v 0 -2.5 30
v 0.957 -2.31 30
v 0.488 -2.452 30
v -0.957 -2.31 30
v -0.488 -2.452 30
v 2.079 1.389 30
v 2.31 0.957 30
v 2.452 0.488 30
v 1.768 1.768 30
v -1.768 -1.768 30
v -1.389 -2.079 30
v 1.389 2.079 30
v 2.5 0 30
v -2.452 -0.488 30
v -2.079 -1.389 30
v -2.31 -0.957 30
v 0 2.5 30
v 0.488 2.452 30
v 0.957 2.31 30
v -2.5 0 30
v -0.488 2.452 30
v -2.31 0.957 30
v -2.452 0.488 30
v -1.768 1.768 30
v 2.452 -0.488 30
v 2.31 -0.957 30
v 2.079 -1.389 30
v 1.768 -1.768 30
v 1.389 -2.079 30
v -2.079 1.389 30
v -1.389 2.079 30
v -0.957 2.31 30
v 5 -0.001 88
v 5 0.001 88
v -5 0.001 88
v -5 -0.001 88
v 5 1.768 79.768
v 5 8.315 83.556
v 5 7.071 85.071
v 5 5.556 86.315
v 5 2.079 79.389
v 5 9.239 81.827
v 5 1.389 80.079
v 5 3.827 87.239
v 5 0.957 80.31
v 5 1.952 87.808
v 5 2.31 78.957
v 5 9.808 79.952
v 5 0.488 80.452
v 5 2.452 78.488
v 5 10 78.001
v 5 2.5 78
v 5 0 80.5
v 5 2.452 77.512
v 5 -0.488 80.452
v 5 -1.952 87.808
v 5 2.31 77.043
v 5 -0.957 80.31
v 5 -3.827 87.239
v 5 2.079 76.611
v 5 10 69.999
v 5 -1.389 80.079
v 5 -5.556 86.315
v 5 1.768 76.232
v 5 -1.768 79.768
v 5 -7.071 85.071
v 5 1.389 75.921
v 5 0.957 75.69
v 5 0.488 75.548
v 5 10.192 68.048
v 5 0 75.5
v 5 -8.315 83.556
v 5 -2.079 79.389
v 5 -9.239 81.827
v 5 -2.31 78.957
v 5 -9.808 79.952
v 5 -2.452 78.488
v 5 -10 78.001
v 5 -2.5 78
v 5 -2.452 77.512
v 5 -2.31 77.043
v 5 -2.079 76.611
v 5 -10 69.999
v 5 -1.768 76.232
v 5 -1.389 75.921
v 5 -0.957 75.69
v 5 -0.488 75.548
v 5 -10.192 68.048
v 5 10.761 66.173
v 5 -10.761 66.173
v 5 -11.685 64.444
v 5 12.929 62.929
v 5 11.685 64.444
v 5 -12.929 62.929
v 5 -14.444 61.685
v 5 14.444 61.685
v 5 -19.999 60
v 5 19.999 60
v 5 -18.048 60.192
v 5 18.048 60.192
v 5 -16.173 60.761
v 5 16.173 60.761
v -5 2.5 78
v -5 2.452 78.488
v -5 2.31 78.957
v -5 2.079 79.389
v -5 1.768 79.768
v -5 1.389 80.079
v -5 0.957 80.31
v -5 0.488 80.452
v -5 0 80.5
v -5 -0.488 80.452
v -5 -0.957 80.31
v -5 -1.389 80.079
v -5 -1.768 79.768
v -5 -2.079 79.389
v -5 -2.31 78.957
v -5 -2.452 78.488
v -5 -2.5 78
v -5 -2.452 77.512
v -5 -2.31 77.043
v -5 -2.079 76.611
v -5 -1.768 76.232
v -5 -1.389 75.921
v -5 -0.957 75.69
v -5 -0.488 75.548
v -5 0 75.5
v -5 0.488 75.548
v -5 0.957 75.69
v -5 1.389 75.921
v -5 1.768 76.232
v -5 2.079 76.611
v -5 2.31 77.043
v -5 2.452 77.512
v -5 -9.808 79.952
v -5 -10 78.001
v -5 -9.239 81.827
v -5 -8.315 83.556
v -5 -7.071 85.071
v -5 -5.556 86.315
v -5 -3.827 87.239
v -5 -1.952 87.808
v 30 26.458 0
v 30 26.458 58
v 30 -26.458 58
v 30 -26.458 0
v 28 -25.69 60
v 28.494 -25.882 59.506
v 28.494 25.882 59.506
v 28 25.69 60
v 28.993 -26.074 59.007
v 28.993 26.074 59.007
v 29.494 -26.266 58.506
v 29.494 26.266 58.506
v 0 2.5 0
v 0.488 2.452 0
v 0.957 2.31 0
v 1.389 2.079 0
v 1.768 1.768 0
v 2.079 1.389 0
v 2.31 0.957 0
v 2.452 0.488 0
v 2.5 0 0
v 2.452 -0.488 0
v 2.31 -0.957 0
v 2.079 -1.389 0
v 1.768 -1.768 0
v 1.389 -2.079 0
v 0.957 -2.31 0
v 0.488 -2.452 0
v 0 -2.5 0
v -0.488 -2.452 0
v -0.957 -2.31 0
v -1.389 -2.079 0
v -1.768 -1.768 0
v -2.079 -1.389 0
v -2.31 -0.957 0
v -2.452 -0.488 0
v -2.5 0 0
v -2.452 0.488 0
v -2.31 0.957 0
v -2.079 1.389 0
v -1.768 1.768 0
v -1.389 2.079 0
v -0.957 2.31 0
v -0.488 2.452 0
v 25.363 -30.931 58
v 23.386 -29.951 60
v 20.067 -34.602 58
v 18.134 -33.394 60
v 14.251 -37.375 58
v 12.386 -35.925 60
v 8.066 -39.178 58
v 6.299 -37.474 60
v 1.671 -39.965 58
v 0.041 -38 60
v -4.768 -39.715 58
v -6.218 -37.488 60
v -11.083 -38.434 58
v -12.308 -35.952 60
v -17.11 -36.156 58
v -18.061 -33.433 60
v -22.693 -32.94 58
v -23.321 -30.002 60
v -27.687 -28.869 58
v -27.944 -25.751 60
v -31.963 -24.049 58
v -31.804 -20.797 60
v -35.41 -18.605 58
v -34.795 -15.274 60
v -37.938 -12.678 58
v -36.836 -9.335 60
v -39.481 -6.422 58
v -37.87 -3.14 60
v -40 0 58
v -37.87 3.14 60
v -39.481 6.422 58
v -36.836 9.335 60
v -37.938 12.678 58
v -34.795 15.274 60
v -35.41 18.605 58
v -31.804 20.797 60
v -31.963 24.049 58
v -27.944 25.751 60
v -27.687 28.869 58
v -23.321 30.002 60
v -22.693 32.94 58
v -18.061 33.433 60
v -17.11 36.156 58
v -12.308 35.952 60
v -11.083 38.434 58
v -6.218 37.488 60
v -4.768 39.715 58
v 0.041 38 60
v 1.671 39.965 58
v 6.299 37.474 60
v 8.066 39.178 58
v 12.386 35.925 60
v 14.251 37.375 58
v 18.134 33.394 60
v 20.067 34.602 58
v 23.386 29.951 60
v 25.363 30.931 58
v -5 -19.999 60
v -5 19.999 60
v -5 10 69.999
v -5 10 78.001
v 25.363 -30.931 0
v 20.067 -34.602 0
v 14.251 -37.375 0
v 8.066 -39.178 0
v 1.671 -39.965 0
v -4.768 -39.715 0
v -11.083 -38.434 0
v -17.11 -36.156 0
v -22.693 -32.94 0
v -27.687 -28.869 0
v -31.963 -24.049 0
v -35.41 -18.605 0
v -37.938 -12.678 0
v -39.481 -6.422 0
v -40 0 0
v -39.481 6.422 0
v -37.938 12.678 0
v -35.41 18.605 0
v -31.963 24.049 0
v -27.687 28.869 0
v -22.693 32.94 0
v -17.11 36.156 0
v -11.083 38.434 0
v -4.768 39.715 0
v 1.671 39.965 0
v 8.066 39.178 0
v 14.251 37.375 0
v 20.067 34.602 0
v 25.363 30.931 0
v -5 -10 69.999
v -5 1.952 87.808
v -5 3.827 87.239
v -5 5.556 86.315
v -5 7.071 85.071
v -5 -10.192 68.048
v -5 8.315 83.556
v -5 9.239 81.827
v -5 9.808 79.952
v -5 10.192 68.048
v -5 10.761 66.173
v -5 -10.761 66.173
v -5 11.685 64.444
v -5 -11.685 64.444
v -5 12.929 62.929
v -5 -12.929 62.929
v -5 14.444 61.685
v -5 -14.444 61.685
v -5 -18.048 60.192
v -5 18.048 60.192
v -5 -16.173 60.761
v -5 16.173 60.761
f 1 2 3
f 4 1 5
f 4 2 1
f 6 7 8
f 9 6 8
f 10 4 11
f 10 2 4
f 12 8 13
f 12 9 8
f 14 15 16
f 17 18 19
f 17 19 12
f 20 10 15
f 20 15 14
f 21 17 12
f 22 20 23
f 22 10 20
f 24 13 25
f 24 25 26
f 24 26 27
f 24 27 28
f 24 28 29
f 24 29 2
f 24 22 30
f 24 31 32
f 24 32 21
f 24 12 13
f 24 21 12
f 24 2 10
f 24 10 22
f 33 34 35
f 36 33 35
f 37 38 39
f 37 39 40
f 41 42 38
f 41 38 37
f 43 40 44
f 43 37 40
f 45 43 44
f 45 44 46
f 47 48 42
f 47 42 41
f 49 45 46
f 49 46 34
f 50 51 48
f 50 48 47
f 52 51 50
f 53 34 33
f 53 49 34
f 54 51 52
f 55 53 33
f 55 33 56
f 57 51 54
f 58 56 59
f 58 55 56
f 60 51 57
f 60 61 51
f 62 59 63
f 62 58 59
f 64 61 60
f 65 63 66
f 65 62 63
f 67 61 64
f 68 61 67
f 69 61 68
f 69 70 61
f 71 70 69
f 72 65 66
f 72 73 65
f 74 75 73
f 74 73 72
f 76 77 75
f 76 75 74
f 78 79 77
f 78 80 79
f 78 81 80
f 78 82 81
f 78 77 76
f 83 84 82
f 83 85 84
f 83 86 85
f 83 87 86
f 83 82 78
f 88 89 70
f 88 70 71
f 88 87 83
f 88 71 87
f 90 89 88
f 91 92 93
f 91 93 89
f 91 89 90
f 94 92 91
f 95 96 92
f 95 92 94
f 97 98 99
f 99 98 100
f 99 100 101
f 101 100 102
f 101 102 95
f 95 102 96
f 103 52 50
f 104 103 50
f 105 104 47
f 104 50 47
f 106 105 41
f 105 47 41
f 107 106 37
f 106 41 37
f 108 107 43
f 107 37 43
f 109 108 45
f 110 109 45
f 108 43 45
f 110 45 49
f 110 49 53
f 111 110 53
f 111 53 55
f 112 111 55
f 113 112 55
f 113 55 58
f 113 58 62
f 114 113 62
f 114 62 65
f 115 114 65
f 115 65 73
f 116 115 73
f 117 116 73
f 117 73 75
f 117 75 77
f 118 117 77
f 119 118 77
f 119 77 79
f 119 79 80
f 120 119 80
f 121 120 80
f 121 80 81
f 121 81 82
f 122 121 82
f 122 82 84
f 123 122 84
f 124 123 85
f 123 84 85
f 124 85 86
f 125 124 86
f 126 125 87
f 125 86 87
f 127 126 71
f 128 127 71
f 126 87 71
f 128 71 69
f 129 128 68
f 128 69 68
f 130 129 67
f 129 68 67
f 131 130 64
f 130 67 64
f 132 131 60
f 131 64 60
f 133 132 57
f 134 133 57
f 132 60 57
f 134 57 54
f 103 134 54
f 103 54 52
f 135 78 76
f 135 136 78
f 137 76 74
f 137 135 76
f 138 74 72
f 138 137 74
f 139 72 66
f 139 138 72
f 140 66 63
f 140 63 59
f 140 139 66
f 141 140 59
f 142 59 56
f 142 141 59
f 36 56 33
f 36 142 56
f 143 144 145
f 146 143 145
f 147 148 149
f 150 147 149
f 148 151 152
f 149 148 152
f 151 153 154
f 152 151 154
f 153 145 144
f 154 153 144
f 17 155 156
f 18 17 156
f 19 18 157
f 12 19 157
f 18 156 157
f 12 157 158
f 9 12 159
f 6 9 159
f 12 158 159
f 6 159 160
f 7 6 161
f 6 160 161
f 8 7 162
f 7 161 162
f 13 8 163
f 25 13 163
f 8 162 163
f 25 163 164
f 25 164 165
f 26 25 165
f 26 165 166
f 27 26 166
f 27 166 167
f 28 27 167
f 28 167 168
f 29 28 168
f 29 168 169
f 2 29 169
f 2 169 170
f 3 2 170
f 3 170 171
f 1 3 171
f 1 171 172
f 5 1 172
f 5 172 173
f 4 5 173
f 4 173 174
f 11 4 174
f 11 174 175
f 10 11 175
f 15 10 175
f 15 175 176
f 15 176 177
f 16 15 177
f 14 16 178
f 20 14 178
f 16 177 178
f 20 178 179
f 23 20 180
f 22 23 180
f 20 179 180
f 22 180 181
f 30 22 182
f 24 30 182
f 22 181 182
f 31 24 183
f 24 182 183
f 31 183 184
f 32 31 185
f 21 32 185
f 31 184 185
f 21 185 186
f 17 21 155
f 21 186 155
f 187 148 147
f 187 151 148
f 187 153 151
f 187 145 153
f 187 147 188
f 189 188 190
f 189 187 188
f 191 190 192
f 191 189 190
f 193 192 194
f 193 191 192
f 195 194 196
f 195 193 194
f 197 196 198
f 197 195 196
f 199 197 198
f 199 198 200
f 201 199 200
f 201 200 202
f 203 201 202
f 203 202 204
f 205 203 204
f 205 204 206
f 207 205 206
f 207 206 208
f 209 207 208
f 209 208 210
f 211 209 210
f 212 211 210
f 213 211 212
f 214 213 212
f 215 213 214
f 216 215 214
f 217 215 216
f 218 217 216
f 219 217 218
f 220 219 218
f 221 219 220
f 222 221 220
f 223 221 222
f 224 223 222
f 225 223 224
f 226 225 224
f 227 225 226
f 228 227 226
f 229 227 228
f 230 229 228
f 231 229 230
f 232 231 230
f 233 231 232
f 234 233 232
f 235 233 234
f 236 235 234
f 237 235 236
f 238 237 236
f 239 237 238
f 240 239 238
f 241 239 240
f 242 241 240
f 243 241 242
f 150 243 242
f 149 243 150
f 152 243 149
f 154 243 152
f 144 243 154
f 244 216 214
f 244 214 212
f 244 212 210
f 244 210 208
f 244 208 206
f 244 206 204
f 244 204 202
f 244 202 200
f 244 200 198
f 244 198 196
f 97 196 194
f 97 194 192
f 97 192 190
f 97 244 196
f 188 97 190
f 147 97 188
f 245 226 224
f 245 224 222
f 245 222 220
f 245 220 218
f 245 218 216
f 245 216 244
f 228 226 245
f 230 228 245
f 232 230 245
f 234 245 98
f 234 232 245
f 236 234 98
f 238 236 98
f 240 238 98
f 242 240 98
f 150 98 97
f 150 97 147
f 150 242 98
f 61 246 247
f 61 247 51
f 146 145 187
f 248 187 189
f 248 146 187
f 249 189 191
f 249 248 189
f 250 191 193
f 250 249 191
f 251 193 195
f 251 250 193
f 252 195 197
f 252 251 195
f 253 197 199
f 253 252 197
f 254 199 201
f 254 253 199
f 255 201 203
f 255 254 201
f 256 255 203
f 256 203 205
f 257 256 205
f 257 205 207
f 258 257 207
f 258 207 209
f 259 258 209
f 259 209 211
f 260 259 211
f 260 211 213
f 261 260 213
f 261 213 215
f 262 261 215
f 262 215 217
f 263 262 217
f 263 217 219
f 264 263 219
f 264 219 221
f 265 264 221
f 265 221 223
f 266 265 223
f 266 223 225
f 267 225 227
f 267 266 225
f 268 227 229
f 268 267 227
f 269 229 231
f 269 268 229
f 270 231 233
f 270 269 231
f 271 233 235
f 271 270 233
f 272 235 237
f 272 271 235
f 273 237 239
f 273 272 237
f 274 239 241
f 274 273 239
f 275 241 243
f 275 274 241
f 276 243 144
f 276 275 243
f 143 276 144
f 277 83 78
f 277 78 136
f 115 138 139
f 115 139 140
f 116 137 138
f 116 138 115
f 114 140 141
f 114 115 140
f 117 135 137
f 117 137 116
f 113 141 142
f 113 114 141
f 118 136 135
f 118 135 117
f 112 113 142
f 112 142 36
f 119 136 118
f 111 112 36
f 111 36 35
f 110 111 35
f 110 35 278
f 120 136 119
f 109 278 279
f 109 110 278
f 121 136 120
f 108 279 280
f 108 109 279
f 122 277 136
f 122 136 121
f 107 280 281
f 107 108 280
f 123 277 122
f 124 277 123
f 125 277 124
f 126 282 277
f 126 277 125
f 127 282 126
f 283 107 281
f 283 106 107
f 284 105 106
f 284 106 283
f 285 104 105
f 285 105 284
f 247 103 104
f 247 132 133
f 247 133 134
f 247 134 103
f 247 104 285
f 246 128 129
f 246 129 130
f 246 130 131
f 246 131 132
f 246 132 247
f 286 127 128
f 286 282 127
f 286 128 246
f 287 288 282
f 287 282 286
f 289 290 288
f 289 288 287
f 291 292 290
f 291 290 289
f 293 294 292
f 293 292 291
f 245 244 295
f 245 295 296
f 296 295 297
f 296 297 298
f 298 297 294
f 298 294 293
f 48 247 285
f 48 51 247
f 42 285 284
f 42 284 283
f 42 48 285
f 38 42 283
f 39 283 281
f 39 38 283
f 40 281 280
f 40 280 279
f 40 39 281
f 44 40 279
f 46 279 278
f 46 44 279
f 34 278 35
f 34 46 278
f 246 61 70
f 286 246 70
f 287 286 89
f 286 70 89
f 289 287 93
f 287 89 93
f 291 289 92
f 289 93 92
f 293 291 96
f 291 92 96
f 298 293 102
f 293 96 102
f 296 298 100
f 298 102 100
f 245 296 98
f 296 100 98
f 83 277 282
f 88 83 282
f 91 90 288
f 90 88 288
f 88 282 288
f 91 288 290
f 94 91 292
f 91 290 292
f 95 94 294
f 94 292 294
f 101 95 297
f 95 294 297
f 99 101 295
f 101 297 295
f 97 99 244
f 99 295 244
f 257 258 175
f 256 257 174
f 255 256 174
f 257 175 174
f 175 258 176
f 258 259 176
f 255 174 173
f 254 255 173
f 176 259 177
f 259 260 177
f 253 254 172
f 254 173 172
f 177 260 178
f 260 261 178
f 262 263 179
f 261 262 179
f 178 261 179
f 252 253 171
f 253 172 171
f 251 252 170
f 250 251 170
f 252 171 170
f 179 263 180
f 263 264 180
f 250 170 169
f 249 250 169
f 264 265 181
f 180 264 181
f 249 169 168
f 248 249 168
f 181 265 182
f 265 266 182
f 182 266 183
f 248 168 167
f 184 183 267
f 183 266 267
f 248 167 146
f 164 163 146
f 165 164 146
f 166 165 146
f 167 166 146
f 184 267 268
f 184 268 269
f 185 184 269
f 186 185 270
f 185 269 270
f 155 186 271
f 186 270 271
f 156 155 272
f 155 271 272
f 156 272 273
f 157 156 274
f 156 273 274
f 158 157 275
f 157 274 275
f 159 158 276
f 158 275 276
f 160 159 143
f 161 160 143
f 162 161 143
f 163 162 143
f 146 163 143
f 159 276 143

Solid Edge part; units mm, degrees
sketch "Sketch1" plane through (0, 0, 0) normal (0, 0, 1) x (1, 0, 0)
  circle A0 centre (0, 0) radius 40
extrude "Protrusion1" add sketch "Sketch1" along normal blind 60
sketch "Sketch2" plane through (0, 0, 60) normal (0, 0, 1) x (0, 1, 0)
  line L0 (10, -5) -> (-10, -5)
  line L1 (-10, -5) -> (-10, 5)
  line L2 (-10, 5) -> (10, 5)
  line L3 (10, 5) -> (10, -5)
extrude "ProtrusiónExtruida_2" add sketch "Sketch2" along normal blind 28
sketch "Sketch3" plane through (5, 0, 74) normal (1, 0, 0) x (0, 1, 0)
  circle A0 centre (0, 4) radius 2.5
extrude "Cutout1" cut sketch "Sketch3" against normal up to next
fillet "Redondeo_1" radius 10 4 edges at (0, -10, 88) (0, 10, 88) (0, -10, 60) (0, 10, 60)
sketch "Sketch4" plane through (0, 0, 0) normal (0, 0, -1) x (0, 1, 0)
  circle A0 centre (0, 0) radius 2.5
extrude "VaciadoExtruido_2" cut sketch "Sketch4" against normal blind 30
sketch "Sketch5" plane through (0, 0, 60) normal (0, 0, 1) x (0, 1, 0)
  line L0 (-40, -40) -> (40, -40)
  line L1 (40, -40) -> (40, -30)
  line L2 (40, -30) -> (-40, -30)
  line L3 (-40, -30) -> (-40, -40)
extrude "Cutout2" cut sketch "Sketch5" against normal through all
chamfer "Chaflán_1" distance 2 angle 45 2 edges at (-40, 0, 60) (30, 0, 60)
